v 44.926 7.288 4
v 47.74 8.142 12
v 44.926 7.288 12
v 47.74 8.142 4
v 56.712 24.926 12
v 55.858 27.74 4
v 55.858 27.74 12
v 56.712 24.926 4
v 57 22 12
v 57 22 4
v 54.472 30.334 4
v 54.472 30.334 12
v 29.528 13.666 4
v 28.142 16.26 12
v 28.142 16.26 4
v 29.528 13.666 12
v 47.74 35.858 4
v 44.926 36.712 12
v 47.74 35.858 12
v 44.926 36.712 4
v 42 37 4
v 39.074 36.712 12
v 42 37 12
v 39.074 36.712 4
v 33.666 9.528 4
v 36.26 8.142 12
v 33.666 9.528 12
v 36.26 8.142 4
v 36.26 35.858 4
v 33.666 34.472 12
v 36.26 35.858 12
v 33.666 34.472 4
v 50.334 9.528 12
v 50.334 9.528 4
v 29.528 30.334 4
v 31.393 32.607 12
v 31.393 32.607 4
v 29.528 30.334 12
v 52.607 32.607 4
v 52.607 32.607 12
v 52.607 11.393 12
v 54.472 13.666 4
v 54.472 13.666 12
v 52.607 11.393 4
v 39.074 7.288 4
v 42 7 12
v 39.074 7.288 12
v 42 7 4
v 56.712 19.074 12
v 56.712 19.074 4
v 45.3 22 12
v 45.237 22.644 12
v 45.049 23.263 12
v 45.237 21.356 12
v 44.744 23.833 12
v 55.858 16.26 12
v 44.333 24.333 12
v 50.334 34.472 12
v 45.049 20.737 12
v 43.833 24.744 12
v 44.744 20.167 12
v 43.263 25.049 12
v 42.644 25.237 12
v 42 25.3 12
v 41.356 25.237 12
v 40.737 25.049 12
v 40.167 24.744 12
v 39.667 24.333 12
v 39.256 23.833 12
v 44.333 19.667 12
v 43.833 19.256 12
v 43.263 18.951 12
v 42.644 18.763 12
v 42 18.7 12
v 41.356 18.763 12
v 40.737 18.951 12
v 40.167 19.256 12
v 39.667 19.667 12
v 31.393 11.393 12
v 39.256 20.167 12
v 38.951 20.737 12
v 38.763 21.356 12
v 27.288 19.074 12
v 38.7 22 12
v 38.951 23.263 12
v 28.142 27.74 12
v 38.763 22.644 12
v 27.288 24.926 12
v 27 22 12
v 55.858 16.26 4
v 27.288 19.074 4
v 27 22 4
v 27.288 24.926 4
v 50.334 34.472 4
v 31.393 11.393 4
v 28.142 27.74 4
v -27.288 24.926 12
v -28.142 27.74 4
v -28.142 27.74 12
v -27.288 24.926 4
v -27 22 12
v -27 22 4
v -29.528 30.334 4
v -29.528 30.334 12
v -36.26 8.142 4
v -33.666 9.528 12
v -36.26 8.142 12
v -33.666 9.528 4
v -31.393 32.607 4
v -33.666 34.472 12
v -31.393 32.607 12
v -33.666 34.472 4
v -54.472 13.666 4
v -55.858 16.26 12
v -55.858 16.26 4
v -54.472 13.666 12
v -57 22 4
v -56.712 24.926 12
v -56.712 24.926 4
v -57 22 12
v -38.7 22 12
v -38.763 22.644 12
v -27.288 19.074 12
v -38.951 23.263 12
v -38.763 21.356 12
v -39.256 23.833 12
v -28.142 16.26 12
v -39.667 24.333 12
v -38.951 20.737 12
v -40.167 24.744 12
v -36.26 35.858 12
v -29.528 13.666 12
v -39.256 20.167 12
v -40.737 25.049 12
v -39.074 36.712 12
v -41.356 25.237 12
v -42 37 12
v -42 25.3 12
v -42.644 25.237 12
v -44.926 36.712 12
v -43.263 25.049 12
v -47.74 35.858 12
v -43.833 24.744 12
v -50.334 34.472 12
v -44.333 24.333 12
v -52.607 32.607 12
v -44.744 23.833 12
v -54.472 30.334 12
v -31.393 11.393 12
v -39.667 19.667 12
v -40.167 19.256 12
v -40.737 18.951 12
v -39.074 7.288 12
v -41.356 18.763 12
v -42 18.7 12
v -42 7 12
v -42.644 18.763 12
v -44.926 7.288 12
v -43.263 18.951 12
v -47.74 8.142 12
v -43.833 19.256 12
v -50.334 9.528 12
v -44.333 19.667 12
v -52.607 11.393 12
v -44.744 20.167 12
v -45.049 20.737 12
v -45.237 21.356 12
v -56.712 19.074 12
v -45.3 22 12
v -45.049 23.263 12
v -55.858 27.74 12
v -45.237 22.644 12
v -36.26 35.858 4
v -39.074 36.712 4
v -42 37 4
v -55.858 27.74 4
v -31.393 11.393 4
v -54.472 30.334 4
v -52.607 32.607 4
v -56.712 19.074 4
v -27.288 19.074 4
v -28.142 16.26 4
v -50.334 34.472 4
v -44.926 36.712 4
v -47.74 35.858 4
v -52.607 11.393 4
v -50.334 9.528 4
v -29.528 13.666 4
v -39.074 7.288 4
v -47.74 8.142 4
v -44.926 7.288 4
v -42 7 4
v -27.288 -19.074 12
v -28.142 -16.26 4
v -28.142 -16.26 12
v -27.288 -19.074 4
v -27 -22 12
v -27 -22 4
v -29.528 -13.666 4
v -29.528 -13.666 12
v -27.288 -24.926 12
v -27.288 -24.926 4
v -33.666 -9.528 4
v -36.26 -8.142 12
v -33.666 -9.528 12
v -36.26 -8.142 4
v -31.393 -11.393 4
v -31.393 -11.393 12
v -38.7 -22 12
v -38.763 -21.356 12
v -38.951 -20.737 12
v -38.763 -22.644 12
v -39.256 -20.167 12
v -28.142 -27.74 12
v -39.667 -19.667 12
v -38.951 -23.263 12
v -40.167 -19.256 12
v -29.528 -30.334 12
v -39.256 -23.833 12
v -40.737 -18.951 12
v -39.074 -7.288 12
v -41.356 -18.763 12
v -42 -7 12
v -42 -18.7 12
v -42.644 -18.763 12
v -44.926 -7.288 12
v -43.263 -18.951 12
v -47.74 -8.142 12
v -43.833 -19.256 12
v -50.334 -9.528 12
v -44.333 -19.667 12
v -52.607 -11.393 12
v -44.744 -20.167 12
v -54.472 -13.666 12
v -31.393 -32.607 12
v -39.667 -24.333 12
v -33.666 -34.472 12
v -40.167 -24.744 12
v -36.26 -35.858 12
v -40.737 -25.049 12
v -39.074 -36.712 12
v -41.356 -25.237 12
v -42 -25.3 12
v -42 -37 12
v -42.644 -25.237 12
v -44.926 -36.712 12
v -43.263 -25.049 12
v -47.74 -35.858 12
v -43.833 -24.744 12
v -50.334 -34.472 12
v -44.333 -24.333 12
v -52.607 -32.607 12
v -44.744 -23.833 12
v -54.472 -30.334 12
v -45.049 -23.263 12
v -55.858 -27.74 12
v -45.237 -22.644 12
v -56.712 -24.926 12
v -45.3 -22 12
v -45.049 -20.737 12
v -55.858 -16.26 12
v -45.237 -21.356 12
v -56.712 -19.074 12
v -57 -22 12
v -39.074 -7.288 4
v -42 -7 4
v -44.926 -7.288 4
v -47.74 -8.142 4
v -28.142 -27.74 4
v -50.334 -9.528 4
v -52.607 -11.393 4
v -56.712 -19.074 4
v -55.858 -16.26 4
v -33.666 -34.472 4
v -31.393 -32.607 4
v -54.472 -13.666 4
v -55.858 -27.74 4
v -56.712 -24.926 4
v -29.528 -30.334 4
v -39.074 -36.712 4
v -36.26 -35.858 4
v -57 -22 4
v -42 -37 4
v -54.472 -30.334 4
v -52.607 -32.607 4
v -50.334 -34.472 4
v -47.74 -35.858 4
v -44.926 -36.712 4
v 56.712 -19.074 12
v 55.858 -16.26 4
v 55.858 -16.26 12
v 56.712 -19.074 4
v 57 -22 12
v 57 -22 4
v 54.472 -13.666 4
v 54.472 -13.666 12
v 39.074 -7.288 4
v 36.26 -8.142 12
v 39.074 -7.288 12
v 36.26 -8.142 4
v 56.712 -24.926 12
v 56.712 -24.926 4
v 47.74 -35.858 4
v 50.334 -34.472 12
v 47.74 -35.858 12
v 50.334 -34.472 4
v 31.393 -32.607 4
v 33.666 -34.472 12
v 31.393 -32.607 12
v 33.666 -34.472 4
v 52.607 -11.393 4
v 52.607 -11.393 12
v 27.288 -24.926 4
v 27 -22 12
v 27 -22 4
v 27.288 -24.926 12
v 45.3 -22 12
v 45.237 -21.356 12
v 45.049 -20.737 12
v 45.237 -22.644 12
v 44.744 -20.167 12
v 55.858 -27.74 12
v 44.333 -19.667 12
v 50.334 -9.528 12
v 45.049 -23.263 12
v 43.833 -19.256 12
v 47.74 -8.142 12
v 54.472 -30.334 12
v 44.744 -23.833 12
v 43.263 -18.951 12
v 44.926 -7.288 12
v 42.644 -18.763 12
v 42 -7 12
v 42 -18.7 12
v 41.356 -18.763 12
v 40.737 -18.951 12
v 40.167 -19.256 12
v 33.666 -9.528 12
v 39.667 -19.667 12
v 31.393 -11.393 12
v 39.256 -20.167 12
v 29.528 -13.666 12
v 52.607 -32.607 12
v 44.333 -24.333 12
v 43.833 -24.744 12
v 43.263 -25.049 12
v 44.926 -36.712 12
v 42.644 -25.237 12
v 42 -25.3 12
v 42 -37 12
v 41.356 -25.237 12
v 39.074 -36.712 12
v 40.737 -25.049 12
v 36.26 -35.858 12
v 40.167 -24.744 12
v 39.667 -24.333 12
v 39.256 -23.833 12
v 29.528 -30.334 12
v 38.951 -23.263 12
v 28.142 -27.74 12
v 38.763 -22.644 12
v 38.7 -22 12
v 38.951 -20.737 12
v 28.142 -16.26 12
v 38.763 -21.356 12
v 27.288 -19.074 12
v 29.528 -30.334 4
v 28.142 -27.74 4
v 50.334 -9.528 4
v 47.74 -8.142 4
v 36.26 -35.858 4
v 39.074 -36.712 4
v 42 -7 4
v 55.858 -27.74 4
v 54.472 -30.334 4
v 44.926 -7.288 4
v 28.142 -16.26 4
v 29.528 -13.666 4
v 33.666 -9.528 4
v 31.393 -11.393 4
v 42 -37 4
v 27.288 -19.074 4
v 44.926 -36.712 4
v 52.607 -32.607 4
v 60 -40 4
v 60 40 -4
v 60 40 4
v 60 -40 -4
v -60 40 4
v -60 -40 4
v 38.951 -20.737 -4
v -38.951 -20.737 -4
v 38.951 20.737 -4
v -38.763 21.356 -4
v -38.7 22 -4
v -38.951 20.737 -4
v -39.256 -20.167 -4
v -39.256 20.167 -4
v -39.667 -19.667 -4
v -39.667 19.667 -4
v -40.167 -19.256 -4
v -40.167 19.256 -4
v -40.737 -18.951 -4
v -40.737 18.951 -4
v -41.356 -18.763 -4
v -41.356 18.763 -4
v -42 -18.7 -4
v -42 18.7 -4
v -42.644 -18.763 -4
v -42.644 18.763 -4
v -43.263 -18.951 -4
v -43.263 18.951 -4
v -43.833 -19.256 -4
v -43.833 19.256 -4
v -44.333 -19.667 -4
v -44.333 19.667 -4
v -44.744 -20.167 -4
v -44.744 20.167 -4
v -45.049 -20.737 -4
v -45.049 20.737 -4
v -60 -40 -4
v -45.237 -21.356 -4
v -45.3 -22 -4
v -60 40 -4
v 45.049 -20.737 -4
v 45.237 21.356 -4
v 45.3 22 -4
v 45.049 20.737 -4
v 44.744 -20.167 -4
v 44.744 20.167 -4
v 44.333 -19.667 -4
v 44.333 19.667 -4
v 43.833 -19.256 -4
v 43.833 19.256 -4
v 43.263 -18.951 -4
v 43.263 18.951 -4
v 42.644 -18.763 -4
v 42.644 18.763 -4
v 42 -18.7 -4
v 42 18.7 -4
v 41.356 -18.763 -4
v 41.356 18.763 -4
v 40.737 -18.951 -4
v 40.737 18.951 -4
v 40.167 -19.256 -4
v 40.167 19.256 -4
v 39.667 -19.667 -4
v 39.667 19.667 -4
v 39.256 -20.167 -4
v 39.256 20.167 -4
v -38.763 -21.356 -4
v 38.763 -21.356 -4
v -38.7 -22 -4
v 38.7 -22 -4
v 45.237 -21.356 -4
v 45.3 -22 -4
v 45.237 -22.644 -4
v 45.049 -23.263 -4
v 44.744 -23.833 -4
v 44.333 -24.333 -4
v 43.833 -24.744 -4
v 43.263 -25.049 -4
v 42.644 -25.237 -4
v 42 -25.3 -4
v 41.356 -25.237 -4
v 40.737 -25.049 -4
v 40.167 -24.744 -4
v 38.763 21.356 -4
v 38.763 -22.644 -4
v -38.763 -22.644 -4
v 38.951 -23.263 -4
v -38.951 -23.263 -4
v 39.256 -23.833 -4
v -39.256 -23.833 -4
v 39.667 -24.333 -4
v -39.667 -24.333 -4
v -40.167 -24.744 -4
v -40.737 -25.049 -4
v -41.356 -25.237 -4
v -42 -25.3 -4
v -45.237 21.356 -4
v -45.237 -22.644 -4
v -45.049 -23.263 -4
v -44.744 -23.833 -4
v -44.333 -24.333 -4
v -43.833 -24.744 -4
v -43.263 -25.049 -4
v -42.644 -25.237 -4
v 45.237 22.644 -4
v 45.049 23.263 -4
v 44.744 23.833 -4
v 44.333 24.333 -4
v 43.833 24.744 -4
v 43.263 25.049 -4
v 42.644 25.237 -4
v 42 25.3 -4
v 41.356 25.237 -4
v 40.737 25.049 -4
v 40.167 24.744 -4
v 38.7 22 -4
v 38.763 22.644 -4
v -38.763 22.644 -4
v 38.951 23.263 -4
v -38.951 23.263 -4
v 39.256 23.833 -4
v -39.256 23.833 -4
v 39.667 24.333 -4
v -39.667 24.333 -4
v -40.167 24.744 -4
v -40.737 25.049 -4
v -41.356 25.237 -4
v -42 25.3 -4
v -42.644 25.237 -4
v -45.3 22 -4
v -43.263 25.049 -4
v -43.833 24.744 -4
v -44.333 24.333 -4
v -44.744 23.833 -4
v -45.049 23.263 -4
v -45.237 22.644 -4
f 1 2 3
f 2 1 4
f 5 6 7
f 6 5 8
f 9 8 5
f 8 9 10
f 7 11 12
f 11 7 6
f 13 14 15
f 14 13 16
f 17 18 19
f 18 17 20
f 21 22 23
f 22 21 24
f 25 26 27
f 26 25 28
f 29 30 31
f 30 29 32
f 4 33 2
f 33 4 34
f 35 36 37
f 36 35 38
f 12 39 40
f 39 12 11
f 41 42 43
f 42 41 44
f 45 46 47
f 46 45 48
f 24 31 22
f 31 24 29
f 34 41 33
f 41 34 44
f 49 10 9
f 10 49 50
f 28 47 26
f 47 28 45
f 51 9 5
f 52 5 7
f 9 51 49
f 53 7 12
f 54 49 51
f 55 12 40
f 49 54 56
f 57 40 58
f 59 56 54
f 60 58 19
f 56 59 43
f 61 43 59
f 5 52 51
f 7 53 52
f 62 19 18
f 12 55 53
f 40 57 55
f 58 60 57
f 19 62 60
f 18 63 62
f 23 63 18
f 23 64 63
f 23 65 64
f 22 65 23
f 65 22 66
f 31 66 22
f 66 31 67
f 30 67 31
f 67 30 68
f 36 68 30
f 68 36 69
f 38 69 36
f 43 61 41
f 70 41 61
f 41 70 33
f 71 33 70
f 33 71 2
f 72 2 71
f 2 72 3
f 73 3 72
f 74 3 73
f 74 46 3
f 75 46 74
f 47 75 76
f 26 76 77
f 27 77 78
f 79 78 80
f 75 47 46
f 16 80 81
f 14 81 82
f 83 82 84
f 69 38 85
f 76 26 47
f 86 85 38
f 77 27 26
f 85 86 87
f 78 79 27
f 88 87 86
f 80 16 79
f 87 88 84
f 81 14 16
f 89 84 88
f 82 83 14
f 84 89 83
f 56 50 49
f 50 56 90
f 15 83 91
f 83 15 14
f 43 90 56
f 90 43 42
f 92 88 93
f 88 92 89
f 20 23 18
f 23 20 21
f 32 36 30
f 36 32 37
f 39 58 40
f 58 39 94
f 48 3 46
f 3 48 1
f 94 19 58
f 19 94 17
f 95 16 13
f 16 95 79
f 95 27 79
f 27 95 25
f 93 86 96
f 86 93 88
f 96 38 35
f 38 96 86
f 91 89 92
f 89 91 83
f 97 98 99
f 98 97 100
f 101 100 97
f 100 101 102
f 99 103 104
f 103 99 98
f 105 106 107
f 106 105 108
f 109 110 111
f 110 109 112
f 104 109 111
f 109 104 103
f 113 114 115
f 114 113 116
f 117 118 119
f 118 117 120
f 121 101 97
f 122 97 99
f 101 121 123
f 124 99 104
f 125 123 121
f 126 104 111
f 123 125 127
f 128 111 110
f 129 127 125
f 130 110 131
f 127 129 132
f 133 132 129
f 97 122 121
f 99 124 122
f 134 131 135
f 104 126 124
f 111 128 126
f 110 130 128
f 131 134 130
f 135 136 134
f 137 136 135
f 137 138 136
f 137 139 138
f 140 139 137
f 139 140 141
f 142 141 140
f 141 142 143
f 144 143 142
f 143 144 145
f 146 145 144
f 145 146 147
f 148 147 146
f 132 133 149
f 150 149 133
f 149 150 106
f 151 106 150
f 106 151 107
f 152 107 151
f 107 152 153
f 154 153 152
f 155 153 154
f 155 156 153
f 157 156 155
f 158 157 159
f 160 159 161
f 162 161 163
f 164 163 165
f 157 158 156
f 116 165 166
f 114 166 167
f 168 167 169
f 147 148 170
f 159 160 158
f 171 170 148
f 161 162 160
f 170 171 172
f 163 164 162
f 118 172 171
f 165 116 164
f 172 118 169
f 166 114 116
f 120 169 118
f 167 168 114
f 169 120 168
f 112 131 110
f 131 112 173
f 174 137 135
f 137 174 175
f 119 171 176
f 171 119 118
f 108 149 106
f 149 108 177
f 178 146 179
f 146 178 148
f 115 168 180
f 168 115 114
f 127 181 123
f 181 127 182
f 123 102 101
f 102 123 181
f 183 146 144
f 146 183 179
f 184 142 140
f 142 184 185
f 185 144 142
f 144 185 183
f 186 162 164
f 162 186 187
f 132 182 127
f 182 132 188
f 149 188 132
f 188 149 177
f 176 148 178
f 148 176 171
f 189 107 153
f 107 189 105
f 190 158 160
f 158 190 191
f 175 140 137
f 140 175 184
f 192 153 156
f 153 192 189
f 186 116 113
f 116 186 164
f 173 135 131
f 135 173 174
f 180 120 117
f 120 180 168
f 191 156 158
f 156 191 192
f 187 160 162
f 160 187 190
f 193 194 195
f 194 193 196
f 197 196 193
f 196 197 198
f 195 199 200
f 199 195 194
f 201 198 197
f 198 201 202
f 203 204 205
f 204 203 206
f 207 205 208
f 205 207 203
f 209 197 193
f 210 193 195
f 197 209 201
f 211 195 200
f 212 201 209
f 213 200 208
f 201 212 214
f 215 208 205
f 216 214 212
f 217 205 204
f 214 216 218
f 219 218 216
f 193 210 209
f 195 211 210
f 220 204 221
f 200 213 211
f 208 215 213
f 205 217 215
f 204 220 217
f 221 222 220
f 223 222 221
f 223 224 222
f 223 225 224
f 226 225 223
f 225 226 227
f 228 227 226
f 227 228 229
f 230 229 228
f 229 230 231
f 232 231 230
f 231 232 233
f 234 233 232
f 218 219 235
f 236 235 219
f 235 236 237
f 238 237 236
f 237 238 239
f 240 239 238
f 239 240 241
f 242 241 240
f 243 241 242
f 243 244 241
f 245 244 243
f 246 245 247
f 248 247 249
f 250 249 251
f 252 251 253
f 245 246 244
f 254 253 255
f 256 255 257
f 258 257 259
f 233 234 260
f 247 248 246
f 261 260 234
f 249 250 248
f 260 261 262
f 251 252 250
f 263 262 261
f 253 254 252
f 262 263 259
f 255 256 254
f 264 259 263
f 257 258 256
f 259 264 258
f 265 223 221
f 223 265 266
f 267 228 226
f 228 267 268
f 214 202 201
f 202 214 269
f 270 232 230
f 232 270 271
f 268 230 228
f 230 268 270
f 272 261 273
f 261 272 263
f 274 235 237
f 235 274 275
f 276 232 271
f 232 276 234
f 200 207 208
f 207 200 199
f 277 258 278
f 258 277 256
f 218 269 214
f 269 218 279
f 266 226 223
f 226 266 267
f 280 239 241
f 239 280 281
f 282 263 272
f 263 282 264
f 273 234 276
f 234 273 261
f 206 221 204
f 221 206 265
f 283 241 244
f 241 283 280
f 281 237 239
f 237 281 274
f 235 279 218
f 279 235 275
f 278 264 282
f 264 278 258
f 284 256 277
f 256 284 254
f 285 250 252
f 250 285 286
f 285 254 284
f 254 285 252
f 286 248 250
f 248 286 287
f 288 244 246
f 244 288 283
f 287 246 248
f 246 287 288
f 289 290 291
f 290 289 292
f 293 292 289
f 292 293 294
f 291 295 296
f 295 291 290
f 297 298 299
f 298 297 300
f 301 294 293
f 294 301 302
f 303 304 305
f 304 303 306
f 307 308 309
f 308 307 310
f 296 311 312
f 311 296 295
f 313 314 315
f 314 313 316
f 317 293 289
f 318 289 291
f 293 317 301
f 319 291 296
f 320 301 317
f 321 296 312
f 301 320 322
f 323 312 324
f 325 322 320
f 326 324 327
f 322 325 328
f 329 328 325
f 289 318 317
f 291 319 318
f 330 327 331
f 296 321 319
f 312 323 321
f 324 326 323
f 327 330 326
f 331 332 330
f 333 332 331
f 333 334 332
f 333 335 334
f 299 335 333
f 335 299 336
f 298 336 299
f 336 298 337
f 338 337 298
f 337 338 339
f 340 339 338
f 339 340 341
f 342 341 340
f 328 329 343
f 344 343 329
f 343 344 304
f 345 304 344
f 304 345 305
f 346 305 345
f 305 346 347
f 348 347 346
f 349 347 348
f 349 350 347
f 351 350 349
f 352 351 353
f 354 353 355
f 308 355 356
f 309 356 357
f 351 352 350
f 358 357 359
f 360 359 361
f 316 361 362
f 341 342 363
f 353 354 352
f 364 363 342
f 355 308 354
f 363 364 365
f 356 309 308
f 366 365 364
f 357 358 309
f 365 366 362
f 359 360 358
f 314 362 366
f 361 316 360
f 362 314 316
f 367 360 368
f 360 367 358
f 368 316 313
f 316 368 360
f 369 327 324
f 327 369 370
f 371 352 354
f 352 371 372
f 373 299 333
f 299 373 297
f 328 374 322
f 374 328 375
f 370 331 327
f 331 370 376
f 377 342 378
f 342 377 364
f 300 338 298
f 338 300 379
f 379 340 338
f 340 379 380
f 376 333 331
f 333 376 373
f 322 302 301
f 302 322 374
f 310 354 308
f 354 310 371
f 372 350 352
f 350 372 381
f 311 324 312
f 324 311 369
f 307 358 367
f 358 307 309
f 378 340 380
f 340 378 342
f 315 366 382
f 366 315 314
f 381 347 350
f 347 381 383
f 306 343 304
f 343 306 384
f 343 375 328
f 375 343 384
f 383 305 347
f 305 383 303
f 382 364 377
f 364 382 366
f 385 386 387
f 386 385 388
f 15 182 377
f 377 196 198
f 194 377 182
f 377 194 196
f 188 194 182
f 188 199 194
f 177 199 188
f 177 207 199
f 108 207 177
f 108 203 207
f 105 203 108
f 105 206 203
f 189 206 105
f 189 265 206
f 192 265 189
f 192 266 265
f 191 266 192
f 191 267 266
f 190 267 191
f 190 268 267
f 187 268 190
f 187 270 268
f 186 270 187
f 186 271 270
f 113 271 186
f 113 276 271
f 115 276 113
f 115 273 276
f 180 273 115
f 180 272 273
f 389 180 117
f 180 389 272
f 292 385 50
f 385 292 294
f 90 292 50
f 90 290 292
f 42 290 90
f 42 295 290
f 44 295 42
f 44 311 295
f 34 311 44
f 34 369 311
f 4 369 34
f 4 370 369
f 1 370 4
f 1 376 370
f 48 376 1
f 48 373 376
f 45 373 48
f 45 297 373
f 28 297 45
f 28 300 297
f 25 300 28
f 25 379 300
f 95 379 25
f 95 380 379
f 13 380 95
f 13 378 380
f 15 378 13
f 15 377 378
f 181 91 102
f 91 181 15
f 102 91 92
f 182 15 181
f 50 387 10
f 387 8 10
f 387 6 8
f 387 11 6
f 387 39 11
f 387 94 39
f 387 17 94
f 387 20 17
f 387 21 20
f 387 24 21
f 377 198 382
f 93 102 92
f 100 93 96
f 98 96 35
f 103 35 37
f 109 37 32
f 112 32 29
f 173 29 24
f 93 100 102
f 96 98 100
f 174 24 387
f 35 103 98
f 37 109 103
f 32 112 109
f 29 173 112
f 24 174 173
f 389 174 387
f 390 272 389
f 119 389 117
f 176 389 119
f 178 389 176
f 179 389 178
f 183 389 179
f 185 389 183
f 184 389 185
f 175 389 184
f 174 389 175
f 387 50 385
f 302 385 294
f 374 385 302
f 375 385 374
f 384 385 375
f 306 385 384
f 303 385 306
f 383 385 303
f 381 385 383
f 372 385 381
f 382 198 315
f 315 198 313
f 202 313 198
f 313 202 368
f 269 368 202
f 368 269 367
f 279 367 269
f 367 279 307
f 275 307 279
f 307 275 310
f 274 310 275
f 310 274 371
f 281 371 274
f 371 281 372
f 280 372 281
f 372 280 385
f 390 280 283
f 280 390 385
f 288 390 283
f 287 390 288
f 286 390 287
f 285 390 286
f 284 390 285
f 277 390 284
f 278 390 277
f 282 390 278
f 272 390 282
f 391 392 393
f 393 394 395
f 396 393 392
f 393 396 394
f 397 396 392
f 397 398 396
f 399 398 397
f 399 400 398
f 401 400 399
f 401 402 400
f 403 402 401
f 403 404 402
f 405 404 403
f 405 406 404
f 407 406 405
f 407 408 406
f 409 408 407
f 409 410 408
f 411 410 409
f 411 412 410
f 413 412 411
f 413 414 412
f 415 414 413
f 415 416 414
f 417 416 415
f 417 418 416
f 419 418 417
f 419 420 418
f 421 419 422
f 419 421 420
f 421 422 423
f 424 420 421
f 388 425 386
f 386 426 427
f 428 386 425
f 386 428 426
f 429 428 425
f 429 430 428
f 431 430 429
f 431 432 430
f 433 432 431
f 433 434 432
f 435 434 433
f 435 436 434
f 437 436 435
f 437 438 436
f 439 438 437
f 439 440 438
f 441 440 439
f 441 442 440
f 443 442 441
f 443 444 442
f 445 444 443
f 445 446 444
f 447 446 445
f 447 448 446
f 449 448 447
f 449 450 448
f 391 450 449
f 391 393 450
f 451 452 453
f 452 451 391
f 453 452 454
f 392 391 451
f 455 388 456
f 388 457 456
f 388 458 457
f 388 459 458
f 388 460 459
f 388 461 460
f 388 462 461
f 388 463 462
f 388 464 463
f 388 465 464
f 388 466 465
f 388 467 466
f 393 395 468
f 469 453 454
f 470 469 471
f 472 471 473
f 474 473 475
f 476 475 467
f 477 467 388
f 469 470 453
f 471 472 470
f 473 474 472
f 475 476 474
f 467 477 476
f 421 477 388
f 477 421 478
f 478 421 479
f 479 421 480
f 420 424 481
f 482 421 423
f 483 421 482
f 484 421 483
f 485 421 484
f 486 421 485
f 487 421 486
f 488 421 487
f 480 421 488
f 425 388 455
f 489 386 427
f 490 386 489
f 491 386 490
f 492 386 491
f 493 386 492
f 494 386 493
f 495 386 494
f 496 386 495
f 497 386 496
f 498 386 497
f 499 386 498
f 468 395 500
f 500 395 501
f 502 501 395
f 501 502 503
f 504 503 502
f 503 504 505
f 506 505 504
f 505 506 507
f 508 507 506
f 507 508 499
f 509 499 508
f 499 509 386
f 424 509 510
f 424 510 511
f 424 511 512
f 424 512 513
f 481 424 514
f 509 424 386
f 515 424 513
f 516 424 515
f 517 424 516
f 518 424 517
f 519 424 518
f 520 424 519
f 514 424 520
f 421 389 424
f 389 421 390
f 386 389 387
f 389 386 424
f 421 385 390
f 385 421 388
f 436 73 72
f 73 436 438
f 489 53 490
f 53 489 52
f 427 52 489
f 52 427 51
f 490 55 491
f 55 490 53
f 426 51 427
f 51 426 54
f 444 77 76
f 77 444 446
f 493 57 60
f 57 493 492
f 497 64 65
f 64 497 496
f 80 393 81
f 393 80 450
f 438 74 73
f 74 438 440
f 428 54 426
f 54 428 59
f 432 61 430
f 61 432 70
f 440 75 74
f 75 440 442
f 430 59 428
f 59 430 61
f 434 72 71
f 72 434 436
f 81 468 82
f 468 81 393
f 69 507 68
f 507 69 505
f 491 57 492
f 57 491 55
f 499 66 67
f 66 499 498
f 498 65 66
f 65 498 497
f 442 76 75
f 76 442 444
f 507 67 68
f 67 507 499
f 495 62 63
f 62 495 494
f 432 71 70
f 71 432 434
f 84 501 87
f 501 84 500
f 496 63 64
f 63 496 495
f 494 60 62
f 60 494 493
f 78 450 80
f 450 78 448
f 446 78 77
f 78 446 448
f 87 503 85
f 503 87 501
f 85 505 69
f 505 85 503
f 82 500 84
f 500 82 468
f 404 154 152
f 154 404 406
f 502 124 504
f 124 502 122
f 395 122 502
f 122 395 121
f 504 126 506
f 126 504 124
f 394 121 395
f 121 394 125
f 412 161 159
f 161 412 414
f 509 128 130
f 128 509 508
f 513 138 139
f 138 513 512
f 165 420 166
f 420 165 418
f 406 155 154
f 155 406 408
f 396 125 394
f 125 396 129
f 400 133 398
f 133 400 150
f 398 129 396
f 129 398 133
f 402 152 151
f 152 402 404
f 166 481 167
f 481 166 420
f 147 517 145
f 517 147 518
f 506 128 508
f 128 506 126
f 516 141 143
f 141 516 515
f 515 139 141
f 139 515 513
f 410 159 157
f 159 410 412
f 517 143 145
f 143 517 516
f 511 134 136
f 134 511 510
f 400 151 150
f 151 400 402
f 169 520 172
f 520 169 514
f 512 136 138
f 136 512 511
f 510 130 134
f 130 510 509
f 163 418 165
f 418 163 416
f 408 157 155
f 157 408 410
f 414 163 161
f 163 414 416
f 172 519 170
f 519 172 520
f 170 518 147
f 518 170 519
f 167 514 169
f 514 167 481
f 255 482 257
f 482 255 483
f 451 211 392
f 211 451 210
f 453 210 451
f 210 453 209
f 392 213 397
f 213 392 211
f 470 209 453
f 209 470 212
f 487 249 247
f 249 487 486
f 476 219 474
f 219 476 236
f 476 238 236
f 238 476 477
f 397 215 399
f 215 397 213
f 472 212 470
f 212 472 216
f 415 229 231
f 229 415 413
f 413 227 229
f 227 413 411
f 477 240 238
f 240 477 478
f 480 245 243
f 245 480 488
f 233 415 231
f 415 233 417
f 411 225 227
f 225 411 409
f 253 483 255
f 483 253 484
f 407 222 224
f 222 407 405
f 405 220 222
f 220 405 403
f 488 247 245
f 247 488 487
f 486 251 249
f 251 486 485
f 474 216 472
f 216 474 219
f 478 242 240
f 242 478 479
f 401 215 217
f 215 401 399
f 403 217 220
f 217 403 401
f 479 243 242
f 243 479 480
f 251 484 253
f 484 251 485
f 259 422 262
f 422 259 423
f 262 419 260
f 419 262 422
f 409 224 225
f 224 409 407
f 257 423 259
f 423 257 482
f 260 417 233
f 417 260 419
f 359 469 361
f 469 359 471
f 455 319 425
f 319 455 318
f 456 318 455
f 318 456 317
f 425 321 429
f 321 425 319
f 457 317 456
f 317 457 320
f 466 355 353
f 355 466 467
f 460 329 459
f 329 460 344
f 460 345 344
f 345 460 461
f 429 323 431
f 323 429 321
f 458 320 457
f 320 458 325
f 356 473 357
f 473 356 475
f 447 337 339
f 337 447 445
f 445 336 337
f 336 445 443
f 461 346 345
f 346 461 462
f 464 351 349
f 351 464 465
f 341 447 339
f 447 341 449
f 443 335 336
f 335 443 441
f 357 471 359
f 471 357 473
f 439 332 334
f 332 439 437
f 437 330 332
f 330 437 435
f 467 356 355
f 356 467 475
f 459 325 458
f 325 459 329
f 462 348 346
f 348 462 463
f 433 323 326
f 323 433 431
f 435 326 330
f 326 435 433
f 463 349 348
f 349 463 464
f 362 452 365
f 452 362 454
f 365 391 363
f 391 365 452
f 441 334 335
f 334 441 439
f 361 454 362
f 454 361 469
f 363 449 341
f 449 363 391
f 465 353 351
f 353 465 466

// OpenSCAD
$fn = 32;

// ----------------------------------------------------------------------
// Anchor pads 120 x 80 x 16
// four corner bosses with anchor holes
// ----------------------------------------------------------------------

// --- parameters (mm) ---
plate = [120, 80, 8];  // base plate size (x, y, z)
pads = 4;              // boss count, one per corner
edge = 18;             // boss centre offset from the plate edge
boss_d = 30;           // boss diameter
boss_h = 8;            // boss height above the base plate
hole_d = 6.6;          // hole diameter

// --- derived feature positions (mm) ---
height = plate[2] + boss_h;      // = 16   overall height of the part
corner_x = plate[0] / 2 - edge;  // = 42   boss centre X
corner_y = plate[1] / 2 - edge;  // = 22   boss centre Y
feature_centers = [
  [corner_x, corner_y],
  [-corner_x, corner_y],
  [-corner_x, -corner_y],
  [corner_x, -corner_y]
];   // boss centres, anchor holes are drilled there

// base plate, four bosses standing on it, anchor holes all the way through
difference() {
  union() {
    cube(plate, center = true);
    for (centre = feature_centers)
      translate([centre[0], centre[1], plate[2] / 2 - 1])
        cylinder(d = boss_d, h = boss_h + 1);
  }
  for (centre = feature_centers)
    translate([centre[0], centre[1], -height])
      cylinder(d = hole_d, h = 2 * height + 2);  // through boss and plate
}
